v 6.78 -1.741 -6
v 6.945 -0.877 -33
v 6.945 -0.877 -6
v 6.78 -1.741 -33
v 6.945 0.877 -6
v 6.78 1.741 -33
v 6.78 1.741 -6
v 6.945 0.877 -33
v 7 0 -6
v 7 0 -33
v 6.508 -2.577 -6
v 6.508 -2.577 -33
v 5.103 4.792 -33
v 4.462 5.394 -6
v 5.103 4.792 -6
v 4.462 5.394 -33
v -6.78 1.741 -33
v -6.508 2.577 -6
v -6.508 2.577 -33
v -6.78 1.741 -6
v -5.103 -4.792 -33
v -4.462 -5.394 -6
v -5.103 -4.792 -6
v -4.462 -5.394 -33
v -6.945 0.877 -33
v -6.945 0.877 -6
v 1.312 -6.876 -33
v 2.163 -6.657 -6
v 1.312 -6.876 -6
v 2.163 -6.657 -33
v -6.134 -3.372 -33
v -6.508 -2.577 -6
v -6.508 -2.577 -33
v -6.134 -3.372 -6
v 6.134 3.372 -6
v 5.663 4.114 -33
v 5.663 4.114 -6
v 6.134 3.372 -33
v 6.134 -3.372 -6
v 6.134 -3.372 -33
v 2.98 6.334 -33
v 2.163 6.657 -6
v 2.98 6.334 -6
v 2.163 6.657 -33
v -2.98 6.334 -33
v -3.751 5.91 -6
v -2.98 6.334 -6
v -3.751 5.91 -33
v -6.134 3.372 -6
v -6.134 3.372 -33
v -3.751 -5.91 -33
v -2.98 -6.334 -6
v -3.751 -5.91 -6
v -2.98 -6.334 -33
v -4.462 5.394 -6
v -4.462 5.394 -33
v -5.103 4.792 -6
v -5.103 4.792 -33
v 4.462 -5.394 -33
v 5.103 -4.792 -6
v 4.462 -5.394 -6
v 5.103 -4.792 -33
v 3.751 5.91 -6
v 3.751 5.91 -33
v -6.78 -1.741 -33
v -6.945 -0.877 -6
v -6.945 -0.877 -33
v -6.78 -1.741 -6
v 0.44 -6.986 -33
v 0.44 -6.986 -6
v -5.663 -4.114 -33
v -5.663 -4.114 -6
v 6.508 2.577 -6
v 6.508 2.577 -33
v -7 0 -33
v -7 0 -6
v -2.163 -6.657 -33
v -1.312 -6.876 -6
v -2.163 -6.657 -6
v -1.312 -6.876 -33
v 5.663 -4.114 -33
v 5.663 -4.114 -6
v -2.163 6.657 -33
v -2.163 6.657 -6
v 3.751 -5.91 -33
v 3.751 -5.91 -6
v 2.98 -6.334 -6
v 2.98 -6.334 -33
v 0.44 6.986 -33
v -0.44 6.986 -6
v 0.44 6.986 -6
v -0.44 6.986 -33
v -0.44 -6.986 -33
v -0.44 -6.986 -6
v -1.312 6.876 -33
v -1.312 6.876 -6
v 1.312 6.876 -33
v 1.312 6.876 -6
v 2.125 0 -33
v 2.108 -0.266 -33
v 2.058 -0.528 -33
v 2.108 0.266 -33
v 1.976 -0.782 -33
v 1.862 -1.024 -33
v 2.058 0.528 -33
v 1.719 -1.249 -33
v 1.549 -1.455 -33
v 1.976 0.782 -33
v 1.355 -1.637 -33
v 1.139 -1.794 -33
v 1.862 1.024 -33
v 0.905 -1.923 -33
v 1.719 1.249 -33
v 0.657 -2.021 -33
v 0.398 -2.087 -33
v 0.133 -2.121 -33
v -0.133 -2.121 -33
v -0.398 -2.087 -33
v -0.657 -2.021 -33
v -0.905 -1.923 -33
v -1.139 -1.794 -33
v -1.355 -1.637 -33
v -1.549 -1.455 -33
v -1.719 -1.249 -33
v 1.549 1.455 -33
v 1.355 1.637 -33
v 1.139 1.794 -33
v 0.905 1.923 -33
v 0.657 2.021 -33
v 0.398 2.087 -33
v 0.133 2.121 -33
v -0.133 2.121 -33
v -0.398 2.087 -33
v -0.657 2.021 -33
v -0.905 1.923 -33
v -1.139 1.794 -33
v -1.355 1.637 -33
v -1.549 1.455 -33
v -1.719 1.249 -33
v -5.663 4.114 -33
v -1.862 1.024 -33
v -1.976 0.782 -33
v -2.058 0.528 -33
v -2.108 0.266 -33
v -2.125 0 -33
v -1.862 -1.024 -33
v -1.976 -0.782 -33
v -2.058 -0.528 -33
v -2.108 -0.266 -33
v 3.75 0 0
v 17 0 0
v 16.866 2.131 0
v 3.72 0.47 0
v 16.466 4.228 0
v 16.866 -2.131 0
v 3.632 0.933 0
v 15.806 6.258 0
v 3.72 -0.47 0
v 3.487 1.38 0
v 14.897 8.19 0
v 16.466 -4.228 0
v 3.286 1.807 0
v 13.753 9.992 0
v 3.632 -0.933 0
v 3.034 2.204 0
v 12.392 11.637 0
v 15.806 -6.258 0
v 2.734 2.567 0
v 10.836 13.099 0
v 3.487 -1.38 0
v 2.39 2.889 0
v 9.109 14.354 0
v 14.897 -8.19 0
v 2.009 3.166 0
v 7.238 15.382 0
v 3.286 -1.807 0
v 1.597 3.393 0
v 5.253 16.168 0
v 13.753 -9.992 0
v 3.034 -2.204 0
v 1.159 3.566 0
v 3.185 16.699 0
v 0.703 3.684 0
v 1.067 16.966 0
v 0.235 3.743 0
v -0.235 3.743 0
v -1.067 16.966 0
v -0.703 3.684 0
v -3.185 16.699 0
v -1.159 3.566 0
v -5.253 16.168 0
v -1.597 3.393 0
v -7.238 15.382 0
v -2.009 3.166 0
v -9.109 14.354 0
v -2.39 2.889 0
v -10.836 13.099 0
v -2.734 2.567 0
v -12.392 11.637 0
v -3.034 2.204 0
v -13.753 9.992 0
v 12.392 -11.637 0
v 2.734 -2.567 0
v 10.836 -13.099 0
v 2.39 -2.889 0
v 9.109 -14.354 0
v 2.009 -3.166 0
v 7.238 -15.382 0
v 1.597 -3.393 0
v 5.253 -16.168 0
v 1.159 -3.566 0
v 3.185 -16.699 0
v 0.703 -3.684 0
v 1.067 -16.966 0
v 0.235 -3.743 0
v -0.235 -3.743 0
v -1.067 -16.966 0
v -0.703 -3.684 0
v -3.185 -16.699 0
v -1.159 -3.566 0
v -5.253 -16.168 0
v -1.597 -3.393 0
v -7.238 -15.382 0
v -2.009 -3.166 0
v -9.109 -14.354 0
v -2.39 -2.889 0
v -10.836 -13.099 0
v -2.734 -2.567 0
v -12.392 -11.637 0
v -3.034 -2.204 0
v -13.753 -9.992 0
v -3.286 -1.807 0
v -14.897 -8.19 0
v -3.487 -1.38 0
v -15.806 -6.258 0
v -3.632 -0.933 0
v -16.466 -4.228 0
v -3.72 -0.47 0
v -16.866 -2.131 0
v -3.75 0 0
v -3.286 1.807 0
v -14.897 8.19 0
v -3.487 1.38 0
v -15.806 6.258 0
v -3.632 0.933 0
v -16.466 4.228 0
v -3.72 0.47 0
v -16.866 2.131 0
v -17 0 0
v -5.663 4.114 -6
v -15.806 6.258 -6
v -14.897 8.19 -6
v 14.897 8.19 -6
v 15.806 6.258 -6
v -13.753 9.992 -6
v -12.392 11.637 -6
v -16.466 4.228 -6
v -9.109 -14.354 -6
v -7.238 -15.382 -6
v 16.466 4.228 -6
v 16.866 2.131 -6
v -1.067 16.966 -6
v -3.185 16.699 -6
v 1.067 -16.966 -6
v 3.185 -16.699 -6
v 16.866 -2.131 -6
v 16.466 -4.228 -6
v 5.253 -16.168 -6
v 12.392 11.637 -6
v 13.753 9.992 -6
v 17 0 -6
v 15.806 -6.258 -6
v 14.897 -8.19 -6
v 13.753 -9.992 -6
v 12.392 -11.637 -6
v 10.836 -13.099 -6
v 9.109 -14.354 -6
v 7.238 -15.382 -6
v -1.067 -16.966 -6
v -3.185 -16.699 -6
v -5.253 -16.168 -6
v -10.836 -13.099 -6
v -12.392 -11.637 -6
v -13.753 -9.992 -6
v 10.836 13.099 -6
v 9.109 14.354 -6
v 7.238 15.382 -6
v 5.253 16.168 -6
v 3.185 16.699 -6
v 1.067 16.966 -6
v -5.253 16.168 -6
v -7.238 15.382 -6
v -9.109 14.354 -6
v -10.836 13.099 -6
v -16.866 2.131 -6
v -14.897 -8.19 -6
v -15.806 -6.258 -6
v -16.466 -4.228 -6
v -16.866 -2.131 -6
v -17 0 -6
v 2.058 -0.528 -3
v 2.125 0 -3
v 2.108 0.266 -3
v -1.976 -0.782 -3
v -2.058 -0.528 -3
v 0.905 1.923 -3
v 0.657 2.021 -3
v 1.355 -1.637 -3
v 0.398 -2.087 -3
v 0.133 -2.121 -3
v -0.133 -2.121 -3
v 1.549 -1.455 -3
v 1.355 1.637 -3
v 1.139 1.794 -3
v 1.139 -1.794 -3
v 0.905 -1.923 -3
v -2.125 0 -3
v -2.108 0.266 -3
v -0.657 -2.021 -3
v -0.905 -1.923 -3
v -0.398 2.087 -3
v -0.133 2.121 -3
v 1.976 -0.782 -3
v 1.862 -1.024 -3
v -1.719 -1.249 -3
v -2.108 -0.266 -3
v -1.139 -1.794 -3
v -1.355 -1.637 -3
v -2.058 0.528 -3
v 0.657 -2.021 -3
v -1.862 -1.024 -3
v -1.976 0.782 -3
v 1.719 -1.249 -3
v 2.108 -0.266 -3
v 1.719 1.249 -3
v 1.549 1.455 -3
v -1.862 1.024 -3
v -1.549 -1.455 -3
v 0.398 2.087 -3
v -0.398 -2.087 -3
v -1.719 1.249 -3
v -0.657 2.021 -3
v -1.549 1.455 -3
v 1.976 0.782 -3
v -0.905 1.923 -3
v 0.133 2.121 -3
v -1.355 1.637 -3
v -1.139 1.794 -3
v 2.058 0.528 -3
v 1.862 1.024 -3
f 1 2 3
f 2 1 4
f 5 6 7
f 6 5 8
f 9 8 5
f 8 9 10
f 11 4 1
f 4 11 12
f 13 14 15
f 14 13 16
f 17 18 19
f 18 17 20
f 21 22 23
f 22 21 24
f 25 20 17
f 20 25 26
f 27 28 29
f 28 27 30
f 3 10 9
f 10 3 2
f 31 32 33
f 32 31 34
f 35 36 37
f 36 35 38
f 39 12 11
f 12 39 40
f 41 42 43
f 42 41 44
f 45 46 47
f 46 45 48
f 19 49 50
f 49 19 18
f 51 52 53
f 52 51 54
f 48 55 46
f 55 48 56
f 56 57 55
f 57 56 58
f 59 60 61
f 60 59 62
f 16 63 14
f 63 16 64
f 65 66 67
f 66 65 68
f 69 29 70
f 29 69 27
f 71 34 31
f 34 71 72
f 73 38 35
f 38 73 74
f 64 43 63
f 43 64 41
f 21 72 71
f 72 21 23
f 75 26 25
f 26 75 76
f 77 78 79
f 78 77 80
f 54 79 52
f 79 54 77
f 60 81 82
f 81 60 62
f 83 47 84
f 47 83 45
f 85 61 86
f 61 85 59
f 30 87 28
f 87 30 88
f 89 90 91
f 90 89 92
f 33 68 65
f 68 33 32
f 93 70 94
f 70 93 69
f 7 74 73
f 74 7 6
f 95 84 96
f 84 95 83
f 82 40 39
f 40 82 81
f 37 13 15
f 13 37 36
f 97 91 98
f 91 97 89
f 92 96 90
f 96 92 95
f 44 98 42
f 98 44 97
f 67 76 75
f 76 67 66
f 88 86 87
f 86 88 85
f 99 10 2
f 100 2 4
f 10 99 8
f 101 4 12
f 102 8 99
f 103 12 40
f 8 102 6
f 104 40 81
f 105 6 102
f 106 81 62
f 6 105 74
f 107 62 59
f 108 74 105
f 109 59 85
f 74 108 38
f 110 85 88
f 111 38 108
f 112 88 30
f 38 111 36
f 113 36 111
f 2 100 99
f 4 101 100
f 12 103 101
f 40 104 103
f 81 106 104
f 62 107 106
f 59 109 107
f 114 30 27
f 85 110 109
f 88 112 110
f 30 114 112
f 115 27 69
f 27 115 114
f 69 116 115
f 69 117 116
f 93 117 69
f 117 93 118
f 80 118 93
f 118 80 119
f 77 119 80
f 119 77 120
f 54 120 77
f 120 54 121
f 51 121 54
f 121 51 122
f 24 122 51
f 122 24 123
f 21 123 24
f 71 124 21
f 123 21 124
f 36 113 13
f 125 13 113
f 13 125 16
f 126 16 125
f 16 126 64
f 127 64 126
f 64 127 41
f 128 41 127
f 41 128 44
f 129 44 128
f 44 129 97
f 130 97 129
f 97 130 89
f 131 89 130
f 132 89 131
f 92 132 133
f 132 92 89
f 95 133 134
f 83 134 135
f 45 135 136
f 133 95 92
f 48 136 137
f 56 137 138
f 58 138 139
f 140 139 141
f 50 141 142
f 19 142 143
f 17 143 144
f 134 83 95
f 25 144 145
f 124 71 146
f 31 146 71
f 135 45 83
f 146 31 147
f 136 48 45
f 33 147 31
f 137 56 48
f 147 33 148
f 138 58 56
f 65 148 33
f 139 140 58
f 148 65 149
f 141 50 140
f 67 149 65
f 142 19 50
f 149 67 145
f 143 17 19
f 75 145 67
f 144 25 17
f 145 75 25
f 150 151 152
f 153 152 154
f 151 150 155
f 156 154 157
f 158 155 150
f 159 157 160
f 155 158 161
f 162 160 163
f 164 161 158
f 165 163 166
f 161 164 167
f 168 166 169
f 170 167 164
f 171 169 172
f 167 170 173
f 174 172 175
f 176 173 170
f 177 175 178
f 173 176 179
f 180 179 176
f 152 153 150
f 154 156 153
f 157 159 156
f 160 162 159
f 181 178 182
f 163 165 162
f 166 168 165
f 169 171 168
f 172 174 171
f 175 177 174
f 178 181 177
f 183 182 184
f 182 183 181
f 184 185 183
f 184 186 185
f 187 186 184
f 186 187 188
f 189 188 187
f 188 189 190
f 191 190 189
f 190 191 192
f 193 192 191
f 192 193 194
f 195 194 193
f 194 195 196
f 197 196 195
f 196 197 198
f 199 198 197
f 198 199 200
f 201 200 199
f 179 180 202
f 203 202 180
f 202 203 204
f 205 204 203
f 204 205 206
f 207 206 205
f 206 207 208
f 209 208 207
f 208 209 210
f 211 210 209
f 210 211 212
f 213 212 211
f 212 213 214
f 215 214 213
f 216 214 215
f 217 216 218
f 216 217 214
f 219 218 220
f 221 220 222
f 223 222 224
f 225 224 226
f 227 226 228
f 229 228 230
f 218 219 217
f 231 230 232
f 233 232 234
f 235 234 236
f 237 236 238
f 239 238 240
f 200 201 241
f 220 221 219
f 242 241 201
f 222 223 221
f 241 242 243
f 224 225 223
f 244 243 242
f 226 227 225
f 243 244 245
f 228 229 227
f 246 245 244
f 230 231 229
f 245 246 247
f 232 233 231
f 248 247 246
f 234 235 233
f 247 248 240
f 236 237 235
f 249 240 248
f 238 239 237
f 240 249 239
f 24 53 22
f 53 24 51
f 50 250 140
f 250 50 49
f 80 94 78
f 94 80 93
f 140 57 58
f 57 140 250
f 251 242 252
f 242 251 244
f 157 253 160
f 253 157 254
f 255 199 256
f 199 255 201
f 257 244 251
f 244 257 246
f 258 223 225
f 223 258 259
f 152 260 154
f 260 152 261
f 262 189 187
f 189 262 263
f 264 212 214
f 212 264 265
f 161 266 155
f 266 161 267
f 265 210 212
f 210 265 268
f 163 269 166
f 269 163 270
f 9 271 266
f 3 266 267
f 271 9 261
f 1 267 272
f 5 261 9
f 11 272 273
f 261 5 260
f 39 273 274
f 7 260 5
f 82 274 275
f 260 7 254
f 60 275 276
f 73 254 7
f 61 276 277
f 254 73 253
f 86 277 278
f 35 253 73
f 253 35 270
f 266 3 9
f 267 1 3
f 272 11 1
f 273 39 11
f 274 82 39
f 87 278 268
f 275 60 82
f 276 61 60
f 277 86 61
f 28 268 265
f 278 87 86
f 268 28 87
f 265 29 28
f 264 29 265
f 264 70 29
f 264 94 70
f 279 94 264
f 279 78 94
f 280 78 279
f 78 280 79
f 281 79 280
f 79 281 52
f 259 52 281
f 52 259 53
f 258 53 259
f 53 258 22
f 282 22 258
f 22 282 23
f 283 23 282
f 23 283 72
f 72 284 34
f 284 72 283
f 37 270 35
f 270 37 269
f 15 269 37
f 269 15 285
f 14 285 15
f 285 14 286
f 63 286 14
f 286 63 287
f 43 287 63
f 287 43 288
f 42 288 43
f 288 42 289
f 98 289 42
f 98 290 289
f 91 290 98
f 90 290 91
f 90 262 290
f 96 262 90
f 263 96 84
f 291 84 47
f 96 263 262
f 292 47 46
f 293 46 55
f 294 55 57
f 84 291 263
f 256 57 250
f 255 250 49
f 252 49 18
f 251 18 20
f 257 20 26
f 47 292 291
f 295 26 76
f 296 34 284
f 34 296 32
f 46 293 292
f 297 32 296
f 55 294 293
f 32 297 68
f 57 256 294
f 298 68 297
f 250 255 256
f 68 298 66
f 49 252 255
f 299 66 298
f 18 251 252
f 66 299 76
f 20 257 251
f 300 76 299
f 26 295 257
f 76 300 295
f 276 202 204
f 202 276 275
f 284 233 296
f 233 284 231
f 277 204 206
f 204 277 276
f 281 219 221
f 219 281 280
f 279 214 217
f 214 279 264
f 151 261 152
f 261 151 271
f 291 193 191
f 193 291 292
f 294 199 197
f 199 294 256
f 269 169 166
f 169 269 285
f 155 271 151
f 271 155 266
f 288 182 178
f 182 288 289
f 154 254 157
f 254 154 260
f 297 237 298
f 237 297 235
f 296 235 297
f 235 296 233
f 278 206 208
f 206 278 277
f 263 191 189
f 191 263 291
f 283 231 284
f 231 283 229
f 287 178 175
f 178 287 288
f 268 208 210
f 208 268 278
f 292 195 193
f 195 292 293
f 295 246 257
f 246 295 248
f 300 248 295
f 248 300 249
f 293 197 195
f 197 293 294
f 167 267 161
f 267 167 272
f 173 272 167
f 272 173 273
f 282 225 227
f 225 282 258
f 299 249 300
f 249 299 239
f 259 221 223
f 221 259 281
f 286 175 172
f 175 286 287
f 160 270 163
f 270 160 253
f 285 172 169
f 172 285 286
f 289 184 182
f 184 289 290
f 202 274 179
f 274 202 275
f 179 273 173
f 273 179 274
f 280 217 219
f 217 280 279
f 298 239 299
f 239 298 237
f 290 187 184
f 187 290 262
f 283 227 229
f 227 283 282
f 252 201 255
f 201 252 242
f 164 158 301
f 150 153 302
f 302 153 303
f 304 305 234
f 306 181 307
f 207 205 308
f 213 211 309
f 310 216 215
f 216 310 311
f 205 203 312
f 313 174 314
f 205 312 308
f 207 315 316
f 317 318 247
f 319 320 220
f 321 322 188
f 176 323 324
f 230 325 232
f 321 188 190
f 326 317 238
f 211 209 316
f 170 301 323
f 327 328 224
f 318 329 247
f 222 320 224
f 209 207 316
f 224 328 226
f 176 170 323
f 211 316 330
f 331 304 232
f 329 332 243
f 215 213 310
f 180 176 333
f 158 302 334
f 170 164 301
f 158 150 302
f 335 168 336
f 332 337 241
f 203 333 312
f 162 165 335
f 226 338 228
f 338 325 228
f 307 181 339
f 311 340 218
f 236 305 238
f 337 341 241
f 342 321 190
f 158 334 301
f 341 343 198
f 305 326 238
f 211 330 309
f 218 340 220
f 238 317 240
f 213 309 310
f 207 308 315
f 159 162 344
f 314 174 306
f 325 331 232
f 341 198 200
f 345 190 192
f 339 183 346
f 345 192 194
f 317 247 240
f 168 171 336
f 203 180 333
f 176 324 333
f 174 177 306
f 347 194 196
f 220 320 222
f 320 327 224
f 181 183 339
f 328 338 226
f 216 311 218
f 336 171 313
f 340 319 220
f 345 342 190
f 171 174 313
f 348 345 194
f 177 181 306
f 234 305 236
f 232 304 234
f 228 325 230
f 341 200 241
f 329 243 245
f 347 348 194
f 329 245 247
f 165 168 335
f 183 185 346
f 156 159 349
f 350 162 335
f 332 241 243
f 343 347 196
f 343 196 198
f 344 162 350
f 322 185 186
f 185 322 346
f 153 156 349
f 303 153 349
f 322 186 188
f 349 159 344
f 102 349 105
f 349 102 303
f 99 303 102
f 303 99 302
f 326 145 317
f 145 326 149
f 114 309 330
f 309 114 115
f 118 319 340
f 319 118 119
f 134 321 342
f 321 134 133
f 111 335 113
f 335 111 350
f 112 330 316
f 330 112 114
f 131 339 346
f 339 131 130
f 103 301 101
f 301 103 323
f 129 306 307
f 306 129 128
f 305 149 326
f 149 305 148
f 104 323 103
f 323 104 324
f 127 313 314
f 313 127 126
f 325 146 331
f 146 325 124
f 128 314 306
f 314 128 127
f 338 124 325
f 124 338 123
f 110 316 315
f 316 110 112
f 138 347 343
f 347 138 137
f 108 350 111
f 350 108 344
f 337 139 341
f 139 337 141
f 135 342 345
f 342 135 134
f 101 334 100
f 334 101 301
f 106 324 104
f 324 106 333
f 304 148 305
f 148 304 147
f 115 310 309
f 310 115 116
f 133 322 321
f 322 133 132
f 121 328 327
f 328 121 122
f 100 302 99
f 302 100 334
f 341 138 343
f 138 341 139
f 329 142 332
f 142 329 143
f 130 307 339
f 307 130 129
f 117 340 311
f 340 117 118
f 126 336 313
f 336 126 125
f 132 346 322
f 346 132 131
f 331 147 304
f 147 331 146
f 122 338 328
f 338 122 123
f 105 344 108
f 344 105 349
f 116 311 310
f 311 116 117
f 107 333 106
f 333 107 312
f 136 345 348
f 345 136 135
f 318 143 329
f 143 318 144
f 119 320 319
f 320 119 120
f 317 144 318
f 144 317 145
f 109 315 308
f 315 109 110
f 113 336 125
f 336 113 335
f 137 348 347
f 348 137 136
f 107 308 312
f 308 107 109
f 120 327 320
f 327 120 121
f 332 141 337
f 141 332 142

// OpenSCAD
$fn = 50;


difference() {
	union() {
		translate(v = [0, 0, -33.0000000000]) {
			cylinder(h = 33, r = 7.0000000000);
		}
		translate(v = [0, 0, -6.0000000000]) {
			cylinder(h = 6, r = 17.0000000000);
		}
	}
	union() {
		translate(v = [0, 0, 0]) {
			rotate(a = [0, 0, 0]) {
				difference() {
					union() {
						#translate(v = [0, 0, -33.0000000000]) {
							cylinder(h = 33, r = 2.0000000000);
						}
						#translate(v = [0, 0, -3]) {
							cylinder(h = 3, r = 7.0000000000, r1 = 2.1250000000, r2 = 3.7500000000);
						}
						#translate(v = [0, 0, -33.0000000000]) {
							cylinder(h = 33, r = 2.1250000000);
						}
						#translate(v = [0, 0, -33.0000000000]) {
							cylinder(h = 33, r = 2.0000000000);
						}
					}
					union();
				}
			}
		}
	}
}
